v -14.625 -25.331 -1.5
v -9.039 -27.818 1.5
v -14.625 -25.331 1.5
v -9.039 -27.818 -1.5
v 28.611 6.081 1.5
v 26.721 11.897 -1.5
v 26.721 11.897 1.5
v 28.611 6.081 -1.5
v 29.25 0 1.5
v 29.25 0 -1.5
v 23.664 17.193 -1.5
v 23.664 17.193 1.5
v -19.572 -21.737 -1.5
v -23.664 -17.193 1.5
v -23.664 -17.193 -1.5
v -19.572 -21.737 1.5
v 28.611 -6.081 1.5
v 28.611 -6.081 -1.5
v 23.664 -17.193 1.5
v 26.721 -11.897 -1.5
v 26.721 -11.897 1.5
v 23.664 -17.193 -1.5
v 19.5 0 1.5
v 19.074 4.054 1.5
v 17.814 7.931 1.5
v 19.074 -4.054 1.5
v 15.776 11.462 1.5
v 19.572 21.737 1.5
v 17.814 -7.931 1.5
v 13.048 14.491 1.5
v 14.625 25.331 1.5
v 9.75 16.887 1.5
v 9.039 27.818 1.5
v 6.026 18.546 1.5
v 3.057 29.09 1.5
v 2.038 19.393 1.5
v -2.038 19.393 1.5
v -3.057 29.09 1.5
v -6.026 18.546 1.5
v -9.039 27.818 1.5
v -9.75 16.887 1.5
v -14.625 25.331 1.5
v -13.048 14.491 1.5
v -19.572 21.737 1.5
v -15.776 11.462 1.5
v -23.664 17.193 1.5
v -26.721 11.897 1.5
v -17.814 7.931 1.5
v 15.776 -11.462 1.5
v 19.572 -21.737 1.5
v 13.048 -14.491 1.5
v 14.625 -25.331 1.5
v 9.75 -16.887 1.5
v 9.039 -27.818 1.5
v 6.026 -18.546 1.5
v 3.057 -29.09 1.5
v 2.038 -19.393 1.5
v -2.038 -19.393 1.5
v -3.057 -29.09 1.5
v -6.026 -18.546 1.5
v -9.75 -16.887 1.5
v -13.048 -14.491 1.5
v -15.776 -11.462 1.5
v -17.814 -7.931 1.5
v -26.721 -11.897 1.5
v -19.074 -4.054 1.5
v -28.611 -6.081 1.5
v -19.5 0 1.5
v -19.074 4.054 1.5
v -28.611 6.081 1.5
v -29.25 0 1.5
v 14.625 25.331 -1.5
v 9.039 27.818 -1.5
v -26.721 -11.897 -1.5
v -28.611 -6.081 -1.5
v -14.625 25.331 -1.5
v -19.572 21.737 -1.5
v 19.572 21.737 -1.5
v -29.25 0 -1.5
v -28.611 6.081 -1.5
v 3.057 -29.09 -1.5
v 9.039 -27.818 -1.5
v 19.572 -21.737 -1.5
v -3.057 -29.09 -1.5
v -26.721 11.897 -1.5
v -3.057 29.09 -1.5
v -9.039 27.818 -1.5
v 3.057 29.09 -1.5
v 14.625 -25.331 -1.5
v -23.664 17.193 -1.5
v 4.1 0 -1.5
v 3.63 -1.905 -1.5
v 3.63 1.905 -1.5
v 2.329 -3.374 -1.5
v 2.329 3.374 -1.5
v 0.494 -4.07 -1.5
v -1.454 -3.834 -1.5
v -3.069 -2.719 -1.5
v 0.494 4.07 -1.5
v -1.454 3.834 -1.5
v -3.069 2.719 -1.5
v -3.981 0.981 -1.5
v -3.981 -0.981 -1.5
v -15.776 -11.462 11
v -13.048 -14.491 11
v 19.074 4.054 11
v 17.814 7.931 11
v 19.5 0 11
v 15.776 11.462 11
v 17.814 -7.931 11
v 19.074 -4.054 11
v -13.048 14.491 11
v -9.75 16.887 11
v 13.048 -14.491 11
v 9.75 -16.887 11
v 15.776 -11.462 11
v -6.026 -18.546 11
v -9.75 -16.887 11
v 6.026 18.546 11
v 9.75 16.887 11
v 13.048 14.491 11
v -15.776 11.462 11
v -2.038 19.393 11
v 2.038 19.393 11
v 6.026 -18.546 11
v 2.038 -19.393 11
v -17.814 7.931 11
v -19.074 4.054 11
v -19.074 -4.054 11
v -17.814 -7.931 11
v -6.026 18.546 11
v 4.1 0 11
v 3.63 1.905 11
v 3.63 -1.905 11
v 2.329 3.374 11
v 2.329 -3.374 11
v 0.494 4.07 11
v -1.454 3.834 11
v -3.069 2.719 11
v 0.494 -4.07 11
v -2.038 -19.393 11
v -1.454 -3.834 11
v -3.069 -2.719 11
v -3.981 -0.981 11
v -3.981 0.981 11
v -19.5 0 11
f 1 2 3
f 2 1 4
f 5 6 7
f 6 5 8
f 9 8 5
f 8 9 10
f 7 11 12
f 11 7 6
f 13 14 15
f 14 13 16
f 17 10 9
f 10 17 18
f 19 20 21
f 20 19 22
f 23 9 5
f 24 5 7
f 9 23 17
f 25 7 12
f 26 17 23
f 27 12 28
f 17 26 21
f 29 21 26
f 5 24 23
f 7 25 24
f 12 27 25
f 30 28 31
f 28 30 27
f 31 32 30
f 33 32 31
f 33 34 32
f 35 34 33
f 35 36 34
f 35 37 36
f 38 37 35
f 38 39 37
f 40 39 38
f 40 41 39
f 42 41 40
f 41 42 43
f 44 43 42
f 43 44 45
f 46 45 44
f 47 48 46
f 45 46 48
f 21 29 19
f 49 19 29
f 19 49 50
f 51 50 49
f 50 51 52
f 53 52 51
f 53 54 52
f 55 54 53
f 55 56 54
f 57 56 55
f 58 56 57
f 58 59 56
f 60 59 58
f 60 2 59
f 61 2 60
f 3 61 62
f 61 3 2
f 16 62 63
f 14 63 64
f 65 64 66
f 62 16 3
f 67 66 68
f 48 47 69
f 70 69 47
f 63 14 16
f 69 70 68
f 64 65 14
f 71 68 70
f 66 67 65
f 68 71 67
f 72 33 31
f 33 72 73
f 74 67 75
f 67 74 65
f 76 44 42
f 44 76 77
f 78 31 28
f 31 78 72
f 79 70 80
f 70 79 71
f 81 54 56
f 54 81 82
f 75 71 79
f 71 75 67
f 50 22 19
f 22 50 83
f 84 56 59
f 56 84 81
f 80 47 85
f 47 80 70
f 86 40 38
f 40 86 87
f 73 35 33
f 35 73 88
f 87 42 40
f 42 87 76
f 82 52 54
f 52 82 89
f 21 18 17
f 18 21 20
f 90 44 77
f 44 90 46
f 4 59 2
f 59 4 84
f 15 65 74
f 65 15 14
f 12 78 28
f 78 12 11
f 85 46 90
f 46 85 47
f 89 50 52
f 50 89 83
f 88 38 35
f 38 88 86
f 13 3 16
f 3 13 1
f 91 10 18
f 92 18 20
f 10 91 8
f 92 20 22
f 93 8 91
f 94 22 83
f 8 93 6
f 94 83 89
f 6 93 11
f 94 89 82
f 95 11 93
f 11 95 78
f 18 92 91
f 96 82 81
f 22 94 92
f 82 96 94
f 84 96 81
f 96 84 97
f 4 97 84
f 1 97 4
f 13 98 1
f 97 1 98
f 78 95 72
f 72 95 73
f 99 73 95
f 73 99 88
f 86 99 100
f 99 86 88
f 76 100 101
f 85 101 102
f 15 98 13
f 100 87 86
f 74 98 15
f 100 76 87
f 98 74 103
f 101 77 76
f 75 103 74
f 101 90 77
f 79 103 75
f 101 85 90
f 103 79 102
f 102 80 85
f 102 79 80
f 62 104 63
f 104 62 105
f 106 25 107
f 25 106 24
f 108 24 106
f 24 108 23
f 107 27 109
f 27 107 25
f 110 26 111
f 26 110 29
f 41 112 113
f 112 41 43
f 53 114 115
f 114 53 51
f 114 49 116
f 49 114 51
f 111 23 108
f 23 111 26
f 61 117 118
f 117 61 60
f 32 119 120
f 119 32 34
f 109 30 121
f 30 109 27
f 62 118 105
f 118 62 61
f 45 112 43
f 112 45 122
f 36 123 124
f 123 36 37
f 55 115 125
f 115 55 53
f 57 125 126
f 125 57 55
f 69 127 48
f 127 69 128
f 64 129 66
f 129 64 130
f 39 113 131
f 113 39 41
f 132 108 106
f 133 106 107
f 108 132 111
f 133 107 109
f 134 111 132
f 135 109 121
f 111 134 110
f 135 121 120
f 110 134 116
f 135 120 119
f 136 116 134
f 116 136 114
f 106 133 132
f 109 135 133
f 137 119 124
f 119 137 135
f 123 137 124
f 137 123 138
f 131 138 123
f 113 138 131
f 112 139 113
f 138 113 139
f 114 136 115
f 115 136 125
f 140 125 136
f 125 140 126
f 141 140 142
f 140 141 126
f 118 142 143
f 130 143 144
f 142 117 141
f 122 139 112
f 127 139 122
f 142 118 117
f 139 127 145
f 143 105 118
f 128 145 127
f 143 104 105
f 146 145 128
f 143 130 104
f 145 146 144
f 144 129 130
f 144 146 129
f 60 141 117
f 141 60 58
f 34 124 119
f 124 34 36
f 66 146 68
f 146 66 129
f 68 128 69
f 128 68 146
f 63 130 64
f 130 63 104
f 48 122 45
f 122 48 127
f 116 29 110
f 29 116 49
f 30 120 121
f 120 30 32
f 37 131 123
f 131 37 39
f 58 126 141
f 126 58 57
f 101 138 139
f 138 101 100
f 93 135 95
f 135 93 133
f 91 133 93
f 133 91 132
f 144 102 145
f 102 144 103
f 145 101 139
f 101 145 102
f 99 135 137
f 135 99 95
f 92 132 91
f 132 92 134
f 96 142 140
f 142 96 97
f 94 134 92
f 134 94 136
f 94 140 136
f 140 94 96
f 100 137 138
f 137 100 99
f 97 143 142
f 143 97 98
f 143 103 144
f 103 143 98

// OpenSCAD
axis_diameter = 8.2;
spool_inter_diameter = 39;

spool_adapter(axis_diameter,spool_inter_diameter);

module spool_adapter(axis_dia=8,spool_dia=40)
difference(){
	union(){
		cylinder(r=spool_dia*.75, h=3, center = true);
		cylinder(r=spool_dia*.5, h=11);
	}
	cylinder(r=axis_dia*.5,h=40,center = true);
}
